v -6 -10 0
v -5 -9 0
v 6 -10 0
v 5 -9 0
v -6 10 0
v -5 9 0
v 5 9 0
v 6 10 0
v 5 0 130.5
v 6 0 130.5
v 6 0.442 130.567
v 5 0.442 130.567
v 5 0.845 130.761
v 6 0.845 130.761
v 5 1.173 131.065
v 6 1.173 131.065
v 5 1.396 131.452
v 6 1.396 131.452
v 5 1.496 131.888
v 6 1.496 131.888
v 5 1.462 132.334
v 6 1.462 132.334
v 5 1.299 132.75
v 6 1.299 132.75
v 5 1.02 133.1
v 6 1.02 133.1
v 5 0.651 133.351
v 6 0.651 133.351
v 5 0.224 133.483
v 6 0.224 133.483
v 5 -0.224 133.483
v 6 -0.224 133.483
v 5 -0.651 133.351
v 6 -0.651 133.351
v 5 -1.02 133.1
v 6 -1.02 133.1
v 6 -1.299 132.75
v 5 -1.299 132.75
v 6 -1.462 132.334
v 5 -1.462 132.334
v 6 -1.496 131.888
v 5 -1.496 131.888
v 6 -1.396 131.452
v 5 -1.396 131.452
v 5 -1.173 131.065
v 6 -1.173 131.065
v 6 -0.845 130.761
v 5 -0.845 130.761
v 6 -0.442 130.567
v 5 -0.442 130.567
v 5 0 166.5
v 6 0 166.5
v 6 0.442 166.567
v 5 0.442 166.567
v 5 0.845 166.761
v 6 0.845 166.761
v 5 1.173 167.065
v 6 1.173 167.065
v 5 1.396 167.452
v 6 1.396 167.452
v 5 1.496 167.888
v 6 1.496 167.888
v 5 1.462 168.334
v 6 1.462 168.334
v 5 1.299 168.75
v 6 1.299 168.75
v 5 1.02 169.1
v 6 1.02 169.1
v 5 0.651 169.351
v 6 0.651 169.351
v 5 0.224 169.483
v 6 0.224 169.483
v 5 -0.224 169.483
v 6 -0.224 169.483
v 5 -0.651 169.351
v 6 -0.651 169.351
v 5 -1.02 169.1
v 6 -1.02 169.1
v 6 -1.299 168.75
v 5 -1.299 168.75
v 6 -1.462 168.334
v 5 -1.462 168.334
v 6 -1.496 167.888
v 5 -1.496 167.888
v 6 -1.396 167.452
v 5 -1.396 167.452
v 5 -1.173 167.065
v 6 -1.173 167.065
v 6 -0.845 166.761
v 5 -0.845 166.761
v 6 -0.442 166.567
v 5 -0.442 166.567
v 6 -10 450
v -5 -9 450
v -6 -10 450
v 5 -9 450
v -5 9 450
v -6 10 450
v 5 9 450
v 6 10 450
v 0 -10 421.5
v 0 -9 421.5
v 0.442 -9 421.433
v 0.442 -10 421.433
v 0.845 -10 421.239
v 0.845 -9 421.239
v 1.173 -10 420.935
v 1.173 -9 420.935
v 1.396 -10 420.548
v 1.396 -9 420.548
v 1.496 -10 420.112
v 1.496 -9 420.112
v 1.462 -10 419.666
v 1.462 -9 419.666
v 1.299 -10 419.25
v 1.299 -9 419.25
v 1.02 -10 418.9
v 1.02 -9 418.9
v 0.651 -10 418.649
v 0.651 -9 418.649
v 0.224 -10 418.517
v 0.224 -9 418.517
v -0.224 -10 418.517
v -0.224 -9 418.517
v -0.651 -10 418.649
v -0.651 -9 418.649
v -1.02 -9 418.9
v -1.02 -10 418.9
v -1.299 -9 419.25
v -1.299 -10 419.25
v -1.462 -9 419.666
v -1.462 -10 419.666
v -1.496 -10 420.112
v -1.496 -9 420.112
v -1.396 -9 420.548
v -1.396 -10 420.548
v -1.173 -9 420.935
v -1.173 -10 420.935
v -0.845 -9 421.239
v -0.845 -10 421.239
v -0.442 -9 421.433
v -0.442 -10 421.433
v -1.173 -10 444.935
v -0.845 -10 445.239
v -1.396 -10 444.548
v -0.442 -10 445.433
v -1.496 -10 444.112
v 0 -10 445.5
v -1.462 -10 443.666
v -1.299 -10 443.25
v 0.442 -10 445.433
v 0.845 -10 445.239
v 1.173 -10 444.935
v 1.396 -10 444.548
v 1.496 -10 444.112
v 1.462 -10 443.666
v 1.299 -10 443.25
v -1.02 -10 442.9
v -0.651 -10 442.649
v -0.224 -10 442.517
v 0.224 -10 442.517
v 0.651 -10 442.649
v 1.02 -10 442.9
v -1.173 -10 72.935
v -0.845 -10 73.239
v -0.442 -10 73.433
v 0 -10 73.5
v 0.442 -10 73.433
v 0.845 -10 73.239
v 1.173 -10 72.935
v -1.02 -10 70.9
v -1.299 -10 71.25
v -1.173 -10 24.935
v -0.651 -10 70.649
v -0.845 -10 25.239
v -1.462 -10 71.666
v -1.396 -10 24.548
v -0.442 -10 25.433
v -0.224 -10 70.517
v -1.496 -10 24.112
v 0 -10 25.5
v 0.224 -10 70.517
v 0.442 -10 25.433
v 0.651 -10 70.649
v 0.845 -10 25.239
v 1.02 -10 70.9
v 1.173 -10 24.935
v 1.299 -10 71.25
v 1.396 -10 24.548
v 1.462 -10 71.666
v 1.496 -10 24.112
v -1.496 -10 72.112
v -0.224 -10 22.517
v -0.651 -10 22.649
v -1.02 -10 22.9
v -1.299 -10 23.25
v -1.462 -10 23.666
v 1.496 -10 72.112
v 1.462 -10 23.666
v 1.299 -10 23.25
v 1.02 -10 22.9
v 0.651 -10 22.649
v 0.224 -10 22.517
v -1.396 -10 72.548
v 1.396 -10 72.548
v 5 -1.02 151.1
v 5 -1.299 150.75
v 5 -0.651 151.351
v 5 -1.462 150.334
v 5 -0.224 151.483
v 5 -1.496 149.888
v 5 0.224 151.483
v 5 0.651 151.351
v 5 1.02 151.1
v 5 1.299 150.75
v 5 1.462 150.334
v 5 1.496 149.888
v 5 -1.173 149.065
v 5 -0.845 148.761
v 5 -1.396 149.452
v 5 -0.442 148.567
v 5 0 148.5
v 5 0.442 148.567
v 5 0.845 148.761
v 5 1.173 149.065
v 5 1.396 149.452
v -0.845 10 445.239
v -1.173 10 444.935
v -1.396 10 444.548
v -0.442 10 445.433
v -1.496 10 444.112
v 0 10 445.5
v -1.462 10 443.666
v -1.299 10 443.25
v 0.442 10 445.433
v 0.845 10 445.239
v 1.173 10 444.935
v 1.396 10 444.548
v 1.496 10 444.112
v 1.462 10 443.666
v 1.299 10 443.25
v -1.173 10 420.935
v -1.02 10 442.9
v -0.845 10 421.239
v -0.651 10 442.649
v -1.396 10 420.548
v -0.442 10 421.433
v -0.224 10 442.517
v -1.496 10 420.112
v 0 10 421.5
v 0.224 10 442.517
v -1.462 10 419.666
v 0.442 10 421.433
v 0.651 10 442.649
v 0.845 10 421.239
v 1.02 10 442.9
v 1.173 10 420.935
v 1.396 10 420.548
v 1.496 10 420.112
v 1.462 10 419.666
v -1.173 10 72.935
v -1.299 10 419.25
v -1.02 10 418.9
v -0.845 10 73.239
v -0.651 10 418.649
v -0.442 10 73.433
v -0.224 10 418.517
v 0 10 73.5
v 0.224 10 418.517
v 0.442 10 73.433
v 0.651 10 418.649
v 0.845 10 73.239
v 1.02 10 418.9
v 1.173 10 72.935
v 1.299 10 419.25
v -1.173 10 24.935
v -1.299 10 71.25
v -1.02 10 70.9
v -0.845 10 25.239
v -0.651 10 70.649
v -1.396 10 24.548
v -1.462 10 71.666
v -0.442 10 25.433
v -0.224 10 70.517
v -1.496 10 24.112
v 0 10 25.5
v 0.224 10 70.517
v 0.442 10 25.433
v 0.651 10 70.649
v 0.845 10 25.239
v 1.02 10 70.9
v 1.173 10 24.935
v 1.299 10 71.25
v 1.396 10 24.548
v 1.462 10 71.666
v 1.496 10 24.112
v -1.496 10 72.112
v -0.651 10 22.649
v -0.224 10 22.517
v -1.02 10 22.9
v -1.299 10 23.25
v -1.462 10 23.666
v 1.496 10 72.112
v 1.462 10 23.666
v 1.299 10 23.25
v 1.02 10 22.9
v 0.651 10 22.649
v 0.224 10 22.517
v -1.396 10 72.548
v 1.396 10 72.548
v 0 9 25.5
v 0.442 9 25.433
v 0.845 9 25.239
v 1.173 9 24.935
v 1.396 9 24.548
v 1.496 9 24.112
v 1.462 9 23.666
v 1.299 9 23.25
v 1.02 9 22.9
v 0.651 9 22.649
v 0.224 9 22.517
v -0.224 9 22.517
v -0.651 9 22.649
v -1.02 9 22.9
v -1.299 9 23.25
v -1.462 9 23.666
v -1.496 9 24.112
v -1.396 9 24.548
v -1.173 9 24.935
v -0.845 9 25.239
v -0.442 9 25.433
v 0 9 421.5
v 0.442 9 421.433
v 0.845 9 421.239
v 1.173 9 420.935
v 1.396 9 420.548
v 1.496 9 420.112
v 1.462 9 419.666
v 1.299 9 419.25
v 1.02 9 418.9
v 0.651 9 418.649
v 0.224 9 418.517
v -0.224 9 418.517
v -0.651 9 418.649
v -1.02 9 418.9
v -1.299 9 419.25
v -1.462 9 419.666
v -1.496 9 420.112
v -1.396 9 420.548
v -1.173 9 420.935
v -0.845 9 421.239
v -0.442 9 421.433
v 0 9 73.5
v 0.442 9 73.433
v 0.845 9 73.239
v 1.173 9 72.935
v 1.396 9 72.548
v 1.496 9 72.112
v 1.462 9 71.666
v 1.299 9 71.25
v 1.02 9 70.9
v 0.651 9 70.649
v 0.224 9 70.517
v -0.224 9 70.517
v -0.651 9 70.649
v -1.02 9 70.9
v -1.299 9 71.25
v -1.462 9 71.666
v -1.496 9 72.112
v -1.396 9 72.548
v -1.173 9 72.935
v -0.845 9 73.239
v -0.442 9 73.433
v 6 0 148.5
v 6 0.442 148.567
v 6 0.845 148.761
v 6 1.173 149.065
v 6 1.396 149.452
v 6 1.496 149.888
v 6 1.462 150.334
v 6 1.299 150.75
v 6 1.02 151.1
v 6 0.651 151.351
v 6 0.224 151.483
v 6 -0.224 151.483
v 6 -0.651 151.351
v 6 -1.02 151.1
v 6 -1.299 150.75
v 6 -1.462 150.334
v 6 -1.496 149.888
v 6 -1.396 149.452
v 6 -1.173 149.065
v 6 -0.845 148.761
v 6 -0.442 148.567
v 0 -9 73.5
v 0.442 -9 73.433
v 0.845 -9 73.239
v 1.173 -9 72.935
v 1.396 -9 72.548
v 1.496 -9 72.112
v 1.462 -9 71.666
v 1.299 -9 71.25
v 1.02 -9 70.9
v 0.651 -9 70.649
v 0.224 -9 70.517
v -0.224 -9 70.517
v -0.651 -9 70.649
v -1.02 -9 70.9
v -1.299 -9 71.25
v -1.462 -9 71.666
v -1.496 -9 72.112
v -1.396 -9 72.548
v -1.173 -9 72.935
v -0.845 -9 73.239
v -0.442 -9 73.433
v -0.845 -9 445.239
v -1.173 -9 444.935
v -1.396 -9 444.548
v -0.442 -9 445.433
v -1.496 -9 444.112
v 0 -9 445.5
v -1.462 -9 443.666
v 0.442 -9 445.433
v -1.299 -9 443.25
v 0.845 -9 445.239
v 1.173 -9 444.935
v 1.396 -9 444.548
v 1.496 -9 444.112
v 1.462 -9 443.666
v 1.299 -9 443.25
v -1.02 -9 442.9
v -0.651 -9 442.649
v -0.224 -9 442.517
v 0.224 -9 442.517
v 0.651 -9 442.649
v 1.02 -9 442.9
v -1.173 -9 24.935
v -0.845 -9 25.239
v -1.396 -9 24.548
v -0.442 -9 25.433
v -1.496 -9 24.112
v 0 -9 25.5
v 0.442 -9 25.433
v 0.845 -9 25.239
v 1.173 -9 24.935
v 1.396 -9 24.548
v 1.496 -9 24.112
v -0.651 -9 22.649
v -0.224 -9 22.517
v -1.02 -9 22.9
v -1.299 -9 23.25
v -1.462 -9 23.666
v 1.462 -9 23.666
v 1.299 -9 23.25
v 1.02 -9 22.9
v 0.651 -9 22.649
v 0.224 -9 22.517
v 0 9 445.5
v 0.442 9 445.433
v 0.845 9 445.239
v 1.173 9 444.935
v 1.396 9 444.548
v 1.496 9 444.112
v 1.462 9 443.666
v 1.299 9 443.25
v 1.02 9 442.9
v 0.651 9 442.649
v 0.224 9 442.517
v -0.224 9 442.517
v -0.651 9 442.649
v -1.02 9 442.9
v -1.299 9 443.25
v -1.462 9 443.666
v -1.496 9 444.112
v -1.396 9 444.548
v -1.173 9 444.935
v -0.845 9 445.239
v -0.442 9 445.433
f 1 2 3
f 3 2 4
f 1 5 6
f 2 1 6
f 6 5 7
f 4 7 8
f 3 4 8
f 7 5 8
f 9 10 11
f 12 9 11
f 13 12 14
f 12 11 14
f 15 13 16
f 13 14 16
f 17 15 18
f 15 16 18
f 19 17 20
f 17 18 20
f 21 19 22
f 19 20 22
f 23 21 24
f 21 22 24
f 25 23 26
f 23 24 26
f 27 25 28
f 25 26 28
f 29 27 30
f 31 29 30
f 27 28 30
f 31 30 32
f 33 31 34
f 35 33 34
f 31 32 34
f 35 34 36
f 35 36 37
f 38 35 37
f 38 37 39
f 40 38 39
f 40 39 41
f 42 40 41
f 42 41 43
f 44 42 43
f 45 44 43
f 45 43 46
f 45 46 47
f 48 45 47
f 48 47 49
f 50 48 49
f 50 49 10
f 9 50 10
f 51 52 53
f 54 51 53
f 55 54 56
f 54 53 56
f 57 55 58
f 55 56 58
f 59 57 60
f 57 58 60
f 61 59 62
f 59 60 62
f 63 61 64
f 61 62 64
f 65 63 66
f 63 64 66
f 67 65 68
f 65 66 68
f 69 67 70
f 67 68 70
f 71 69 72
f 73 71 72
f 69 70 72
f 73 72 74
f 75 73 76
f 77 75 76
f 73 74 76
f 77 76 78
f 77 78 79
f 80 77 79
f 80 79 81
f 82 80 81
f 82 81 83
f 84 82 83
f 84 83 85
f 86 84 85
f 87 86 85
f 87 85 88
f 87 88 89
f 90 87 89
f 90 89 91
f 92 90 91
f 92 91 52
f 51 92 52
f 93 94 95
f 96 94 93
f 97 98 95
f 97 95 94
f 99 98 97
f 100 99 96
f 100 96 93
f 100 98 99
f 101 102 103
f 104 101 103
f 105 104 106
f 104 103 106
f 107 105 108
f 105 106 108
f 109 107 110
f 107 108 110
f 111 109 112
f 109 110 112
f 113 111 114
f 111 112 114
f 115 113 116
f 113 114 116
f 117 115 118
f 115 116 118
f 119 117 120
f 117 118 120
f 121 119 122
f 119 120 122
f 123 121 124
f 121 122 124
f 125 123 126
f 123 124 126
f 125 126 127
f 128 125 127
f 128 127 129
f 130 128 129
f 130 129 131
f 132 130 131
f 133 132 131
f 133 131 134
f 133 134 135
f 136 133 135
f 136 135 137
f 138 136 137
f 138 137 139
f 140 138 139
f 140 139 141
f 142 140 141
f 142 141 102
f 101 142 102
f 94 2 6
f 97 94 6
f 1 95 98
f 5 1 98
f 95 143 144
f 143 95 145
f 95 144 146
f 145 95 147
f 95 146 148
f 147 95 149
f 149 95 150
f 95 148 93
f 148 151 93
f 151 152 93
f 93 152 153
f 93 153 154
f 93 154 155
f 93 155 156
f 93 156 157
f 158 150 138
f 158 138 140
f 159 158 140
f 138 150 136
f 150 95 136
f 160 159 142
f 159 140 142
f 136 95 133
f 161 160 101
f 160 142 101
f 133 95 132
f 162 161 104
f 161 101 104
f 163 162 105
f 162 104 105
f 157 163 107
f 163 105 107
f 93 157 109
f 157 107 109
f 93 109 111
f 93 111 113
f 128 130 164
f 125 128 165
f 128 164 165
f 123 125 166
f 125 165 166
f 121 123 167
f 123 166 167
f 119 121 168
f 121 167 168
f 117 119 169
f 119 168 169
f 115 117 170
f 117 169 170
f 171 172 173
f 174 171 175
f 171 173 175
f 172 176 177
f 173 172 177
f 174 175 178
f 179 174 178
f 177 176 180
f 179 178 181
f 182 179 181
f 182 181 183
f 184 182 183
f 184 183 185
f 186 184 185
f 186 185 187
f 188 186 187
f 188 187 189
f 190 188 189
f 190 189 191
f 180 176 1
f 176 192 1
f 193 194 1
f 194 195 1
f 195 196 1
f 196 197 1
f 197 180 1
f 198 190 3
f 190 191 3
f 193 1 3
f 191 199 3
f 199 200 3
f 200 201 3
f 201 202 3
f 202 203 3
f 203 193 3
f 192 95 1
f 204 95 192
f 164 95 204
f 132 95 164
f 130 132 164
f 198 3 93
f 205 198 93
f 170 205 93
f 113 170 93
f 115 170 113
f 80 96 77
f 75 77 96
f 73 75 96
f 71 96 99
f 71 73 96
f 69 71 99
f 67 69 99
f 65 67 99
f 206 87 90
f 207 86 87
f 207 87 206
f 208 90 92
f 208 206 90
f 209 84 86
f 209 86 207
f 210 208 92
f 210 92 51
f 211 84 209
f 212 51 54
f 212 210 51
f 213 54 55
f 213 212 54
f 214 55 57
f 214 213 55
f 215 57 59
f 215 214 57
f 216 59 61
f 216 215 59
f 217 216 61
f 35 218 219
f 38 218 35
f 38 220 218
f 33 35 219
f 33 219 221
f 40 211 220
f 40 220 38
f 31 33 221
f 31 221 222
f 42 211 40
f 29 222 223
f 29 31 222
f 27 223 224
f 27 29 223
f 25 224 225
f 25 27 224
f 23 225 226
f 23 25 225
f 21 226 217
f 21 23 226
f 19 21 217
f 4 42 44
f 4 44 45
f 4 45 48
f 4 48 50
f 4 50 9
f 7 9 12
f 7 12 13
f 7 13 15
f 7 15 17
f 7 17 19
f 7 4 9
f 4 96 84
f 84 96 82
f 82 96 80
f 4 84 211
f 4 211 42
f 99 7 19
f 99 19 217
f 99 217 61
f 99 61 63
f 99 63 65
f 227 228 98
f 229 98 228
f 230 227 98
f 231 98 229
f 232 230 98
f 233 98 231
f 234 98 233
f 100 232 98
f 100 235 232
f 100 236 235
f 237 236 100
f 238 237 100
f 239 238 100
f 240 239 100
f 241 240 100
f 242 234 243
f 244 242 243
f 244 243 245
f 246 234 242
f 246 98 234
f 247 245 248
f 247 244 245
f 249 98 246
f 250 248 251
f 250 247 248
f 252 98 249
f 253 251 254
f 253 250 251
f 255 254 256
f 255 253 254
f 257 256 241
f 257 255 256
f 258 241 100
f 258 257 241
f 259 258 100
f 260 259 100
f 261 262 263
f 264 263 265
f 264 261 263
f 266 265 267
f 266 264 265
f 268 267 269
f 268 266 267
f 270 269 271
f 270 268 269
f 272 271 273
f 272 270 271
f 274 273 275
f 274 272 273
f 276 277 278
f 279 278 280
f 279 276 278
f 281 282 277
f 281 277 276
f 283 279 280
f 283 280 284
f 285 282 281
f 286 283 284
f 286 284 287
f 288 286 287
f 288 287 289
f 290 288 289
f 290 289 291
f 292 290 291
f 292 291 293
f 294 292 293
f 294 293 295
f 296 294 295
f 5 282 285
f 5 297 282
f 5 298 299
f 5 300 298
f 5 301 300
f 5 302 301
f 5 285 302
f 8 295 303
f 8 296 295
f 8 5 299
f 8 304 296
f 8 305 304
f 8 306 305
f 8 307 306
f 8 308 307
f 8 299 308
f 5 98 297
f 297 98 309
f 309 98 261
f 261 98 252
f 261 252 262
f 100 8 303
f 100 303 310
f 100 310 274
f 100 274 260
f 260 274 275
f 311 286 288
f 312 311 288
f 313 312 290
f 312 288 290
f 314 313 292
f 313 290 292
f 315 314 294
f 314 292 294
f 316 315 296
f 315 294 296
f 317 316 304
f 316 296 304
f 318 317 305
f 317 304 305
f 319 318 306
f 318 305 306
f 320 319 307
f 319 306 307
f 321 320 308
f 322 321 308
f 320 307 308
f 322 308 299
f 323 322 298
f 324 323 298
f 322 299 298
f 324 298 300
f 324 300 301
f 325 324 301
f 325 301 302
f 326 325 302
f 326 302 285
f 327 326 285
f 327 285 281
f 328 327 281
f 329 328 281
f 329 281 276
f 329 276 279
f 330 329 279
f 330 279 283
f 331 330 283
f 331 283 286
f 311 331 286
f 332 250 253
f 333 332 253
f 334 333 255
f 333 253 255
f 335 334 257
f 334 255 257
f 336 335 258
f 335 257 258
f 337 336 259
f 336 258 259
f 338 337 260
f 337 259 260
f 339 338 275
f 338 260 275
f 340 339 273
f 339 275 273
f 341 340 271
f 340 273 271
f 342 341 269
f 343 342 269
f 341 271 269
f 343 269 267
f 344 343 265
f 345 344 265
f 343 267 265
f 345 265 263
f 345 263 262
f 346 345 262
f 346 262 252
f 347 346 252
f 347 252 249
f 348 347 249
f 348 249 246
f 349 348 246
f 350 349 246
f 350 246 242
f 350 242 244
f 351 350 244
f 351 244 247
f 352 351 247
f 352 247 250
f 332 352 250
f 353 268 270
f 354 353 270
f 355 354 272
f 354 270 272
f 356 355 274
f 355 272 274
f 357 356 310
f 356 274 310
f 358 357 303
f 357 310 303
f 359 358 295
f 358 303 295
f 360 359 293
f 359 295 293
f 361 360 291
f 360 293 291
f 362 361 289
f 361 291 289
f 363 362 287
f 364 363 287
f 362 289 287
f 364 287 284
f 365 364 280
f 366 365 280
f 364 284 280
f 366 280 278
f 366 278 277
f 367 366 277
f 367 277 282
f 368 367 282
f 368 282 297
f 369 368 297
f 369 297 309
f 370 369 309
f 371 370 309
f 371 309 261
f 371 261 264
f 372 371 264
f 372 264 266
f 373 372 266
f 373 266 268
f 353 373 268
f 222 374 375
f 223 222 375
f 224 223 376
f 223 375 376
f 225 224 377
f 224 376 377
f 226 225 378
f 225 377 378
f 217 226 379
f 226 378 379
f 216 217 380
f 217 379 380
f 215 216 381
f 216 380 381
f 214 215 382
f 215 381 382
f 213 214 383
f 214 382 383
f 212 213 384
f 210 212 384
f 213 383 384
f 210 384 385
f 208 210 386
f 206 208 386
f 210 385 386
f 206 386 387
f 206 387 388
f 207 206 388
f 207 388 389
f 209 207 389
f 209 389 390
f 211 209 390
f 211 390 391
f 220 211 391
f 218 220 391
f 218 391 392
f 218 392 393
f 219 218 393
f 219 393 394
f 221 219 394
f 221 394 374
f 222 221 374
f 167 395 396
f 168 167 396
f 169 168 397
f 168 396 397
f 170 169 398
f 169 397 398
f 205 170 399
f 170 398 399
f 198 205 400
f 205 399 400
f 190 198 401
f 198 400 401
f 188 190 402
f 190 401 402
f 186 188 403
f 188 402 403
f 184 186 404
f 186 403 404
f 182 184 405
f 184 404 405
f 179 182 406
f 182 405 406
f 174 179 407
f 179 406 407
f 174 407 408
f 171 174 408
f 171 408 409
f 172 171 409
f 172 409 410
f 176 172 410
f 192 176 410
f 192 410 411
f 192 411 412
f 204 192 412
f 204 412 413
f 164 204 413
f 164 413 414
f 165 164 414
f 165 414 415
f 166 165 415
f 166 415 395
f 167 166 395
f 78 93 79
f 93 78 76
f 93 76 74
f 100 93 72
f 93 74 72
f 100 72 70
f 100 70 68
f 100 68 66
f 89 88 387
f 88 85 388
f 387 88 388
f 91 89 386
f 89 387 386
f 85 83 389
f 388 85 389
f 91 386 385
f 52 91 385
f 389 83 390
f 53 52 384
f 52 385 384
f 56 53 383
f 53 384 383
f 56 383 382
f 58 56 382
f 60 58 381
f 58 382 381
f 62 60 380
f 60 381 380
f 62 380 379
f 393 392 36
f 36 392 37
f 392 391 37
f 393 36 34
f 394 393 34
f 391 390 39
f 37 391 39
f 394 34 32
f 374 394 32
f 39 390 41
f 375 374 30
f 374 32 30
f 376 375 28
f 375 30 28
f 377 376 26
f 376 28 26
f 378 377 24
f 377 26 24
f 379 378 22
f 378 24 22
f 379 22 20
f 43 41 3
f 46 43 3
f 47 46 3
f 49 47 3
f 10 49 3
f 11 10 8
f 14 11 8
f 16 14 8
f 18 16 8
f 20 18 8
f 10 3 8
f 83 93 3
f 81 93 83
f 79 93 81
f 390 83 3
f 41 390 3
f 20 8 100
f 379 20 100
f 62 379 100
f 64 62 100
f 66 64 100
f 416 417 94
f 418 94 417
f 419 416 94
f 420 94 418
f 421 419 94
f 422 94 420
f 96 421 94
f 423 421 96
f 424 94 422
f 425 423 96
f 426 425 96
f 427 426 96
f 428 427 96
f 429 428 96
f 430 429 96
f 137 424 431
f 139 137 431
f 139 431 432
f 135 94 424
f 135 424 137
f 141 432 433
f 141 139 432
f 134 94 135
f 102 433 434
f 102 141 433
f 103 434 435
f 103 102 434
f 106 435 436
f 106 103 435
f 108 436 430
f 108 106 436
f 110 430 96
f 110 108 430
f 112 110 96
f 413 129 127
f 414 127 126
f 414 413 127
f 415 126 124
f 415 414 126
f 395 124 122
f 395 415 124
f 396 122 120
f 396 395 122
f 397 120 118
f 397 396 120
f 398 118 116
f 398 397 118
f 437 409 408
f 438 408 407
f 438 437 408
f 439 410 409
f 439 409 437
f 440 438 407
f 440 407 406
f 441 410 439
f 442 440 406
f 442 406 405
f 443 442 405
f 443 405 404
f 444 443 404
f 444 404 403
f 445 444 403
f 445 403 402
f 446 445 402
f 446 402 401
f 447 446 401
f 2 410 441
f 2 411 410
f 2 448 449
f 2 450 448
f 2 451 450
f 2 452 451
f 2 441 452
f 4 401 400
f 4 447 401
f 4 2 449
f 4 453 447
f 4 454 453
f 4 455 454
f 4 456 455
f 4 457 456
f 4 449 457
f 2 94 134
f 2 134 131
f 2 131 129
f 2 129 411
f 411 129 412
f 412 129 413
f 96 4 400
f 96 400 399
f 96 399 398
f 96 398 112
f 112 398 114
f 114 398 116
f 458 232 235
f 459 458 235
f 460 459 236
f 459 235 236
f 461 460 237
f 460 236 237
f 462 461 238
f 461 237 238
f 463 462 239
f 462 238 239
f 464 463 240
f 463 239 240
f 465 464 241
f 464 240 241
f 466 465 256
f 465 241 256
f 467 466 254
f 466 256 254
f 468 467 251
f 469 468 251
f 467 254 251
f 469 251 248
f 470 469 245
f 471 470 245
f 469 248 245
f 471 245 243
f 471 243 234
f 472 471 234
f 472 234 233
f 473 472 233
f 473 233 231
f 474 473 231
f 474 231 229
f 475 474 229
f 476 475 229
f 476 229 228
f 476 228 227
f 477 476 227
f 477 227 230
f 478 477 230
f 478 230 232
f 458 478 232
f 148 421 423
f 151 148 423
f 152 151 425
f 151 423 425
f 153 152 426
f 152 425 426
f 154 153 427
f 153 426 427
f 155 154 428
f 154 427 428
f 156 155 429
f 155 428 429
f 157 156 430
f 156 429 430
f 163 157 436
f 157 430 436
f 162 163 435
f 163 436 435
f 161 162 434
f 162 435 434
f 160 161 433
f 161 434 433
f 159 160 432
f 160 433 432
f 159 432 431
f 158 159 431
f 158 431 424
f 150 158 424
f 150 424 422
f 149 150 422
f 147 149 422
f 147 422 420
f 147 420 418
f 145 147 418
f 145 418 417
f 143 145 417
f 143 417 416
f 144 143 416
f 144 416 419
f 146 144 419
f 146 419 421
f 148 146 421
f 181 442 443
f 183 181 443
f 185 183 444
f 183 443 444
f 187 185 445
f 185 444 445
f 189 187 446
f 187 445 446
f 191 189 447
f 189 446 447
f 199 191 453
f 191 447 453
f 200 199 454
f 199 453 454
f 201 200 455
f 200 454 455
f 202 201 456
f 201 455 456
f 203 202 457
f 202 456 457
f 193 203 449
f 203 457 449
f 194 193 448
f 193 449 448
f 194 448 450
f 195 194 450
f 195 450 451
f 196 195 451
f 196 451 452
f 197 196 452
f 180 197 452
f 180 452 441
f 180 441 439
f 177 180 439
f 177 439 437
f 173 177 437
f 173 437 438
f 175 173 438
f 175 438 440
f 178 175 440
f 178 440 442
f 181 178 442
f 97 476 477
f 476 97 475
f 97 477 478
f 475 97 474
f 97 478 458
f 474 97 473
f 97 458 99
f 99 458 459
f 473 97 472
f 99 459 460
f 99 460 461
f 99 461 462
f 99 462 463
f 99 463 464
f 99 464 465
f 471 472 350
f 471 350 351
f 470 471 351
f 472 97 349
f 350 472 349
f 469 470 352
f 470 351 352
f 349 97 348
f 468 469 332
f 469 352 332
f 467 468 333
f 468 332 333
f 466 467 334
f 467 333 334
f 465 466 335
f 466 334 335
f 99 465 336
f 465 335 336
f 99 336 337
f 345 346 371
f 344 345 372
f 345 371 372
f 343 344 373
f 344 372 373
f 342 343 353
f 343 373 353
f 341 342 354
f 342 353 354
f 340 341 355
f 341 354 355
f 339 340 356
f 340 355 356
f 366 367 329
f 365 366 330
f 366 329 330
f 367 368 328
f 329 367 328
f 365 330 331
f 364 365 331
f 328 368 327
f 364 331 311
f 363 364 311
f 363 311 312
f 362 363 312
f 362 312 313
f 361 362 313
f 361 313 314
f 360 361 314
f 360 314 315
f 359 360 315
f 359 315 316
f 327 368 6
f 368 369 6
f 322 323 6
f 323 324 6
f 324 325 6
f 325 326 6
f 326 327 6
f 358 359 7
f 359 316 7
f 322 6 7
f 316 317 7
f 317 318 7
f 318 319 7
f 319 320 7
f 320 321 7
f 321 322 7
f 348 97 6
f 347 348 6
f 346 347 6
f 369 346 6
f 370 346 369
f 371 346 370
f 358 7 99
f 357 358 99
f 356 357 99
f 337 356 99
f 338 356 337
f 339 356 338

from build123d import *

# Parameters (mm, degrees)
SKETCH1_W           = 12
SKETCH1_H           = 20
SKETCH1_W_2         = 10
SKETCH1_H_2         = 18
BOSS_EXTRUDE1_DEPTH = 450
CUT_EXTRUDE1_REACH  = 452.271
SKETCH2_R           = 1.5
SKETCH3_R           = 1.5
CUT_EXTRUDE2_DEPTH  = 451.484183962


with BuildPart() as part:
    # Sketch1 → Boss-Extrude1 (new body)
    with BuildSketch(Plane.XY):
        Rectangle(SKETCH1_W, SKETCH1_H)
        Rectangle(SKETCH1_W_2, SKETCH1_H_2, mode=Mode.SUBTRACT)
    extrude(amount=BOSS_EXTRUDE1_DEPTH)

    # Sketch2 → Cut-Extrude1 (cut, up to next)
    with BuildSketch(Plane(origin=(6, 0, 0), x_dir=(0, 0, -1), z_dir=(1, 0, 0)), mode=Mode.PRIVATE) as cut_extrude1_sk1:
        with Locations((-168, 0)):
            Circle(SKETCH2_R)
    cut_extrude1_tool1 = extrude(cut_extrude1_sk1.sketch, amount=-CUT_EXTRUDE1_REACH, mode=Mode.PRIVATE) & part.part
    # Sketch2 → Cut-Extrude1 (cut, up to next)
    with BuildSketch(Plane(origin=(6, 0, 0), x_dir=(0, 0, -1), z_dir=(1, 0, 0)), mode=Mode.PRIVATE) as cut_extrude1_sk2:
        with Locations((-150, 0)):
            Circle(SKETCH2_R)
    cut_extrude1_tool2 = extrude(cut_extrude1_sk2.sketch, amount=-CUT_EXTRUDE1_REACH, mode=Mode.PRIVATE) & part.part
    # Sketch2 → Cut-Extrude1 (cut, up to next)
    with BuildSketch(Plane(origin=(6, 0, 0), x_dir=(0, 0, -1), z_dir=(1, 0, 0)), mode=Mode.PRIVATE) as cut_extrude1_sk3:
        with Locations((-132, 0)):
            Circle(SKETCH2_R)
    cut_extrude1_tool3 = extrude(cut_extrude1_sk3.sketch, amount=-CUT_EXTRUDE1_REACH, mode=Mode.PRIVATE) & part.part
    add(cut_extrude1_tool1.solids().sort_by_distance((6, 0, 168))[0], mode=Mode.SUBTRACT)
    add(cut_extrude1_tool2.solids().sort_by_distance((6, 0, 150))[0], mode=Mode.SUBTRACT)
    add(cut_extrude1_tool3.solids().sort_by_distance((6, 0, 132))[0], mode=Mode.SUBTRACT)

    # Sketch3 → Cut-Extrude2 (cut, through all)
    with BuildSketch(Plane(origin=(0, 10, 0), x_dir=(1, 0, 0), z_dir=(0, 1, 0))):
        with Locations(Location((0, -444, 0), (0, 0, 270))):
            Circle(SKETCH3_R)
        with Locations(Location((0, -420, 0), (0, 0, 270))):
            Circle(SKETCH3_R)
        with Locations(Location((0, -24, 0), (0, 0, 270))):
            Circle(SKETCH3_R)
        with Locations(Location((0, -72, 0), (0, 0, 270))):
            Circle(SKETCH3_R)
    extrude(amount=-CUT_EXTRUDE2_DEPTH, mode=Mode.SUBTRACT)


solid = part.part
